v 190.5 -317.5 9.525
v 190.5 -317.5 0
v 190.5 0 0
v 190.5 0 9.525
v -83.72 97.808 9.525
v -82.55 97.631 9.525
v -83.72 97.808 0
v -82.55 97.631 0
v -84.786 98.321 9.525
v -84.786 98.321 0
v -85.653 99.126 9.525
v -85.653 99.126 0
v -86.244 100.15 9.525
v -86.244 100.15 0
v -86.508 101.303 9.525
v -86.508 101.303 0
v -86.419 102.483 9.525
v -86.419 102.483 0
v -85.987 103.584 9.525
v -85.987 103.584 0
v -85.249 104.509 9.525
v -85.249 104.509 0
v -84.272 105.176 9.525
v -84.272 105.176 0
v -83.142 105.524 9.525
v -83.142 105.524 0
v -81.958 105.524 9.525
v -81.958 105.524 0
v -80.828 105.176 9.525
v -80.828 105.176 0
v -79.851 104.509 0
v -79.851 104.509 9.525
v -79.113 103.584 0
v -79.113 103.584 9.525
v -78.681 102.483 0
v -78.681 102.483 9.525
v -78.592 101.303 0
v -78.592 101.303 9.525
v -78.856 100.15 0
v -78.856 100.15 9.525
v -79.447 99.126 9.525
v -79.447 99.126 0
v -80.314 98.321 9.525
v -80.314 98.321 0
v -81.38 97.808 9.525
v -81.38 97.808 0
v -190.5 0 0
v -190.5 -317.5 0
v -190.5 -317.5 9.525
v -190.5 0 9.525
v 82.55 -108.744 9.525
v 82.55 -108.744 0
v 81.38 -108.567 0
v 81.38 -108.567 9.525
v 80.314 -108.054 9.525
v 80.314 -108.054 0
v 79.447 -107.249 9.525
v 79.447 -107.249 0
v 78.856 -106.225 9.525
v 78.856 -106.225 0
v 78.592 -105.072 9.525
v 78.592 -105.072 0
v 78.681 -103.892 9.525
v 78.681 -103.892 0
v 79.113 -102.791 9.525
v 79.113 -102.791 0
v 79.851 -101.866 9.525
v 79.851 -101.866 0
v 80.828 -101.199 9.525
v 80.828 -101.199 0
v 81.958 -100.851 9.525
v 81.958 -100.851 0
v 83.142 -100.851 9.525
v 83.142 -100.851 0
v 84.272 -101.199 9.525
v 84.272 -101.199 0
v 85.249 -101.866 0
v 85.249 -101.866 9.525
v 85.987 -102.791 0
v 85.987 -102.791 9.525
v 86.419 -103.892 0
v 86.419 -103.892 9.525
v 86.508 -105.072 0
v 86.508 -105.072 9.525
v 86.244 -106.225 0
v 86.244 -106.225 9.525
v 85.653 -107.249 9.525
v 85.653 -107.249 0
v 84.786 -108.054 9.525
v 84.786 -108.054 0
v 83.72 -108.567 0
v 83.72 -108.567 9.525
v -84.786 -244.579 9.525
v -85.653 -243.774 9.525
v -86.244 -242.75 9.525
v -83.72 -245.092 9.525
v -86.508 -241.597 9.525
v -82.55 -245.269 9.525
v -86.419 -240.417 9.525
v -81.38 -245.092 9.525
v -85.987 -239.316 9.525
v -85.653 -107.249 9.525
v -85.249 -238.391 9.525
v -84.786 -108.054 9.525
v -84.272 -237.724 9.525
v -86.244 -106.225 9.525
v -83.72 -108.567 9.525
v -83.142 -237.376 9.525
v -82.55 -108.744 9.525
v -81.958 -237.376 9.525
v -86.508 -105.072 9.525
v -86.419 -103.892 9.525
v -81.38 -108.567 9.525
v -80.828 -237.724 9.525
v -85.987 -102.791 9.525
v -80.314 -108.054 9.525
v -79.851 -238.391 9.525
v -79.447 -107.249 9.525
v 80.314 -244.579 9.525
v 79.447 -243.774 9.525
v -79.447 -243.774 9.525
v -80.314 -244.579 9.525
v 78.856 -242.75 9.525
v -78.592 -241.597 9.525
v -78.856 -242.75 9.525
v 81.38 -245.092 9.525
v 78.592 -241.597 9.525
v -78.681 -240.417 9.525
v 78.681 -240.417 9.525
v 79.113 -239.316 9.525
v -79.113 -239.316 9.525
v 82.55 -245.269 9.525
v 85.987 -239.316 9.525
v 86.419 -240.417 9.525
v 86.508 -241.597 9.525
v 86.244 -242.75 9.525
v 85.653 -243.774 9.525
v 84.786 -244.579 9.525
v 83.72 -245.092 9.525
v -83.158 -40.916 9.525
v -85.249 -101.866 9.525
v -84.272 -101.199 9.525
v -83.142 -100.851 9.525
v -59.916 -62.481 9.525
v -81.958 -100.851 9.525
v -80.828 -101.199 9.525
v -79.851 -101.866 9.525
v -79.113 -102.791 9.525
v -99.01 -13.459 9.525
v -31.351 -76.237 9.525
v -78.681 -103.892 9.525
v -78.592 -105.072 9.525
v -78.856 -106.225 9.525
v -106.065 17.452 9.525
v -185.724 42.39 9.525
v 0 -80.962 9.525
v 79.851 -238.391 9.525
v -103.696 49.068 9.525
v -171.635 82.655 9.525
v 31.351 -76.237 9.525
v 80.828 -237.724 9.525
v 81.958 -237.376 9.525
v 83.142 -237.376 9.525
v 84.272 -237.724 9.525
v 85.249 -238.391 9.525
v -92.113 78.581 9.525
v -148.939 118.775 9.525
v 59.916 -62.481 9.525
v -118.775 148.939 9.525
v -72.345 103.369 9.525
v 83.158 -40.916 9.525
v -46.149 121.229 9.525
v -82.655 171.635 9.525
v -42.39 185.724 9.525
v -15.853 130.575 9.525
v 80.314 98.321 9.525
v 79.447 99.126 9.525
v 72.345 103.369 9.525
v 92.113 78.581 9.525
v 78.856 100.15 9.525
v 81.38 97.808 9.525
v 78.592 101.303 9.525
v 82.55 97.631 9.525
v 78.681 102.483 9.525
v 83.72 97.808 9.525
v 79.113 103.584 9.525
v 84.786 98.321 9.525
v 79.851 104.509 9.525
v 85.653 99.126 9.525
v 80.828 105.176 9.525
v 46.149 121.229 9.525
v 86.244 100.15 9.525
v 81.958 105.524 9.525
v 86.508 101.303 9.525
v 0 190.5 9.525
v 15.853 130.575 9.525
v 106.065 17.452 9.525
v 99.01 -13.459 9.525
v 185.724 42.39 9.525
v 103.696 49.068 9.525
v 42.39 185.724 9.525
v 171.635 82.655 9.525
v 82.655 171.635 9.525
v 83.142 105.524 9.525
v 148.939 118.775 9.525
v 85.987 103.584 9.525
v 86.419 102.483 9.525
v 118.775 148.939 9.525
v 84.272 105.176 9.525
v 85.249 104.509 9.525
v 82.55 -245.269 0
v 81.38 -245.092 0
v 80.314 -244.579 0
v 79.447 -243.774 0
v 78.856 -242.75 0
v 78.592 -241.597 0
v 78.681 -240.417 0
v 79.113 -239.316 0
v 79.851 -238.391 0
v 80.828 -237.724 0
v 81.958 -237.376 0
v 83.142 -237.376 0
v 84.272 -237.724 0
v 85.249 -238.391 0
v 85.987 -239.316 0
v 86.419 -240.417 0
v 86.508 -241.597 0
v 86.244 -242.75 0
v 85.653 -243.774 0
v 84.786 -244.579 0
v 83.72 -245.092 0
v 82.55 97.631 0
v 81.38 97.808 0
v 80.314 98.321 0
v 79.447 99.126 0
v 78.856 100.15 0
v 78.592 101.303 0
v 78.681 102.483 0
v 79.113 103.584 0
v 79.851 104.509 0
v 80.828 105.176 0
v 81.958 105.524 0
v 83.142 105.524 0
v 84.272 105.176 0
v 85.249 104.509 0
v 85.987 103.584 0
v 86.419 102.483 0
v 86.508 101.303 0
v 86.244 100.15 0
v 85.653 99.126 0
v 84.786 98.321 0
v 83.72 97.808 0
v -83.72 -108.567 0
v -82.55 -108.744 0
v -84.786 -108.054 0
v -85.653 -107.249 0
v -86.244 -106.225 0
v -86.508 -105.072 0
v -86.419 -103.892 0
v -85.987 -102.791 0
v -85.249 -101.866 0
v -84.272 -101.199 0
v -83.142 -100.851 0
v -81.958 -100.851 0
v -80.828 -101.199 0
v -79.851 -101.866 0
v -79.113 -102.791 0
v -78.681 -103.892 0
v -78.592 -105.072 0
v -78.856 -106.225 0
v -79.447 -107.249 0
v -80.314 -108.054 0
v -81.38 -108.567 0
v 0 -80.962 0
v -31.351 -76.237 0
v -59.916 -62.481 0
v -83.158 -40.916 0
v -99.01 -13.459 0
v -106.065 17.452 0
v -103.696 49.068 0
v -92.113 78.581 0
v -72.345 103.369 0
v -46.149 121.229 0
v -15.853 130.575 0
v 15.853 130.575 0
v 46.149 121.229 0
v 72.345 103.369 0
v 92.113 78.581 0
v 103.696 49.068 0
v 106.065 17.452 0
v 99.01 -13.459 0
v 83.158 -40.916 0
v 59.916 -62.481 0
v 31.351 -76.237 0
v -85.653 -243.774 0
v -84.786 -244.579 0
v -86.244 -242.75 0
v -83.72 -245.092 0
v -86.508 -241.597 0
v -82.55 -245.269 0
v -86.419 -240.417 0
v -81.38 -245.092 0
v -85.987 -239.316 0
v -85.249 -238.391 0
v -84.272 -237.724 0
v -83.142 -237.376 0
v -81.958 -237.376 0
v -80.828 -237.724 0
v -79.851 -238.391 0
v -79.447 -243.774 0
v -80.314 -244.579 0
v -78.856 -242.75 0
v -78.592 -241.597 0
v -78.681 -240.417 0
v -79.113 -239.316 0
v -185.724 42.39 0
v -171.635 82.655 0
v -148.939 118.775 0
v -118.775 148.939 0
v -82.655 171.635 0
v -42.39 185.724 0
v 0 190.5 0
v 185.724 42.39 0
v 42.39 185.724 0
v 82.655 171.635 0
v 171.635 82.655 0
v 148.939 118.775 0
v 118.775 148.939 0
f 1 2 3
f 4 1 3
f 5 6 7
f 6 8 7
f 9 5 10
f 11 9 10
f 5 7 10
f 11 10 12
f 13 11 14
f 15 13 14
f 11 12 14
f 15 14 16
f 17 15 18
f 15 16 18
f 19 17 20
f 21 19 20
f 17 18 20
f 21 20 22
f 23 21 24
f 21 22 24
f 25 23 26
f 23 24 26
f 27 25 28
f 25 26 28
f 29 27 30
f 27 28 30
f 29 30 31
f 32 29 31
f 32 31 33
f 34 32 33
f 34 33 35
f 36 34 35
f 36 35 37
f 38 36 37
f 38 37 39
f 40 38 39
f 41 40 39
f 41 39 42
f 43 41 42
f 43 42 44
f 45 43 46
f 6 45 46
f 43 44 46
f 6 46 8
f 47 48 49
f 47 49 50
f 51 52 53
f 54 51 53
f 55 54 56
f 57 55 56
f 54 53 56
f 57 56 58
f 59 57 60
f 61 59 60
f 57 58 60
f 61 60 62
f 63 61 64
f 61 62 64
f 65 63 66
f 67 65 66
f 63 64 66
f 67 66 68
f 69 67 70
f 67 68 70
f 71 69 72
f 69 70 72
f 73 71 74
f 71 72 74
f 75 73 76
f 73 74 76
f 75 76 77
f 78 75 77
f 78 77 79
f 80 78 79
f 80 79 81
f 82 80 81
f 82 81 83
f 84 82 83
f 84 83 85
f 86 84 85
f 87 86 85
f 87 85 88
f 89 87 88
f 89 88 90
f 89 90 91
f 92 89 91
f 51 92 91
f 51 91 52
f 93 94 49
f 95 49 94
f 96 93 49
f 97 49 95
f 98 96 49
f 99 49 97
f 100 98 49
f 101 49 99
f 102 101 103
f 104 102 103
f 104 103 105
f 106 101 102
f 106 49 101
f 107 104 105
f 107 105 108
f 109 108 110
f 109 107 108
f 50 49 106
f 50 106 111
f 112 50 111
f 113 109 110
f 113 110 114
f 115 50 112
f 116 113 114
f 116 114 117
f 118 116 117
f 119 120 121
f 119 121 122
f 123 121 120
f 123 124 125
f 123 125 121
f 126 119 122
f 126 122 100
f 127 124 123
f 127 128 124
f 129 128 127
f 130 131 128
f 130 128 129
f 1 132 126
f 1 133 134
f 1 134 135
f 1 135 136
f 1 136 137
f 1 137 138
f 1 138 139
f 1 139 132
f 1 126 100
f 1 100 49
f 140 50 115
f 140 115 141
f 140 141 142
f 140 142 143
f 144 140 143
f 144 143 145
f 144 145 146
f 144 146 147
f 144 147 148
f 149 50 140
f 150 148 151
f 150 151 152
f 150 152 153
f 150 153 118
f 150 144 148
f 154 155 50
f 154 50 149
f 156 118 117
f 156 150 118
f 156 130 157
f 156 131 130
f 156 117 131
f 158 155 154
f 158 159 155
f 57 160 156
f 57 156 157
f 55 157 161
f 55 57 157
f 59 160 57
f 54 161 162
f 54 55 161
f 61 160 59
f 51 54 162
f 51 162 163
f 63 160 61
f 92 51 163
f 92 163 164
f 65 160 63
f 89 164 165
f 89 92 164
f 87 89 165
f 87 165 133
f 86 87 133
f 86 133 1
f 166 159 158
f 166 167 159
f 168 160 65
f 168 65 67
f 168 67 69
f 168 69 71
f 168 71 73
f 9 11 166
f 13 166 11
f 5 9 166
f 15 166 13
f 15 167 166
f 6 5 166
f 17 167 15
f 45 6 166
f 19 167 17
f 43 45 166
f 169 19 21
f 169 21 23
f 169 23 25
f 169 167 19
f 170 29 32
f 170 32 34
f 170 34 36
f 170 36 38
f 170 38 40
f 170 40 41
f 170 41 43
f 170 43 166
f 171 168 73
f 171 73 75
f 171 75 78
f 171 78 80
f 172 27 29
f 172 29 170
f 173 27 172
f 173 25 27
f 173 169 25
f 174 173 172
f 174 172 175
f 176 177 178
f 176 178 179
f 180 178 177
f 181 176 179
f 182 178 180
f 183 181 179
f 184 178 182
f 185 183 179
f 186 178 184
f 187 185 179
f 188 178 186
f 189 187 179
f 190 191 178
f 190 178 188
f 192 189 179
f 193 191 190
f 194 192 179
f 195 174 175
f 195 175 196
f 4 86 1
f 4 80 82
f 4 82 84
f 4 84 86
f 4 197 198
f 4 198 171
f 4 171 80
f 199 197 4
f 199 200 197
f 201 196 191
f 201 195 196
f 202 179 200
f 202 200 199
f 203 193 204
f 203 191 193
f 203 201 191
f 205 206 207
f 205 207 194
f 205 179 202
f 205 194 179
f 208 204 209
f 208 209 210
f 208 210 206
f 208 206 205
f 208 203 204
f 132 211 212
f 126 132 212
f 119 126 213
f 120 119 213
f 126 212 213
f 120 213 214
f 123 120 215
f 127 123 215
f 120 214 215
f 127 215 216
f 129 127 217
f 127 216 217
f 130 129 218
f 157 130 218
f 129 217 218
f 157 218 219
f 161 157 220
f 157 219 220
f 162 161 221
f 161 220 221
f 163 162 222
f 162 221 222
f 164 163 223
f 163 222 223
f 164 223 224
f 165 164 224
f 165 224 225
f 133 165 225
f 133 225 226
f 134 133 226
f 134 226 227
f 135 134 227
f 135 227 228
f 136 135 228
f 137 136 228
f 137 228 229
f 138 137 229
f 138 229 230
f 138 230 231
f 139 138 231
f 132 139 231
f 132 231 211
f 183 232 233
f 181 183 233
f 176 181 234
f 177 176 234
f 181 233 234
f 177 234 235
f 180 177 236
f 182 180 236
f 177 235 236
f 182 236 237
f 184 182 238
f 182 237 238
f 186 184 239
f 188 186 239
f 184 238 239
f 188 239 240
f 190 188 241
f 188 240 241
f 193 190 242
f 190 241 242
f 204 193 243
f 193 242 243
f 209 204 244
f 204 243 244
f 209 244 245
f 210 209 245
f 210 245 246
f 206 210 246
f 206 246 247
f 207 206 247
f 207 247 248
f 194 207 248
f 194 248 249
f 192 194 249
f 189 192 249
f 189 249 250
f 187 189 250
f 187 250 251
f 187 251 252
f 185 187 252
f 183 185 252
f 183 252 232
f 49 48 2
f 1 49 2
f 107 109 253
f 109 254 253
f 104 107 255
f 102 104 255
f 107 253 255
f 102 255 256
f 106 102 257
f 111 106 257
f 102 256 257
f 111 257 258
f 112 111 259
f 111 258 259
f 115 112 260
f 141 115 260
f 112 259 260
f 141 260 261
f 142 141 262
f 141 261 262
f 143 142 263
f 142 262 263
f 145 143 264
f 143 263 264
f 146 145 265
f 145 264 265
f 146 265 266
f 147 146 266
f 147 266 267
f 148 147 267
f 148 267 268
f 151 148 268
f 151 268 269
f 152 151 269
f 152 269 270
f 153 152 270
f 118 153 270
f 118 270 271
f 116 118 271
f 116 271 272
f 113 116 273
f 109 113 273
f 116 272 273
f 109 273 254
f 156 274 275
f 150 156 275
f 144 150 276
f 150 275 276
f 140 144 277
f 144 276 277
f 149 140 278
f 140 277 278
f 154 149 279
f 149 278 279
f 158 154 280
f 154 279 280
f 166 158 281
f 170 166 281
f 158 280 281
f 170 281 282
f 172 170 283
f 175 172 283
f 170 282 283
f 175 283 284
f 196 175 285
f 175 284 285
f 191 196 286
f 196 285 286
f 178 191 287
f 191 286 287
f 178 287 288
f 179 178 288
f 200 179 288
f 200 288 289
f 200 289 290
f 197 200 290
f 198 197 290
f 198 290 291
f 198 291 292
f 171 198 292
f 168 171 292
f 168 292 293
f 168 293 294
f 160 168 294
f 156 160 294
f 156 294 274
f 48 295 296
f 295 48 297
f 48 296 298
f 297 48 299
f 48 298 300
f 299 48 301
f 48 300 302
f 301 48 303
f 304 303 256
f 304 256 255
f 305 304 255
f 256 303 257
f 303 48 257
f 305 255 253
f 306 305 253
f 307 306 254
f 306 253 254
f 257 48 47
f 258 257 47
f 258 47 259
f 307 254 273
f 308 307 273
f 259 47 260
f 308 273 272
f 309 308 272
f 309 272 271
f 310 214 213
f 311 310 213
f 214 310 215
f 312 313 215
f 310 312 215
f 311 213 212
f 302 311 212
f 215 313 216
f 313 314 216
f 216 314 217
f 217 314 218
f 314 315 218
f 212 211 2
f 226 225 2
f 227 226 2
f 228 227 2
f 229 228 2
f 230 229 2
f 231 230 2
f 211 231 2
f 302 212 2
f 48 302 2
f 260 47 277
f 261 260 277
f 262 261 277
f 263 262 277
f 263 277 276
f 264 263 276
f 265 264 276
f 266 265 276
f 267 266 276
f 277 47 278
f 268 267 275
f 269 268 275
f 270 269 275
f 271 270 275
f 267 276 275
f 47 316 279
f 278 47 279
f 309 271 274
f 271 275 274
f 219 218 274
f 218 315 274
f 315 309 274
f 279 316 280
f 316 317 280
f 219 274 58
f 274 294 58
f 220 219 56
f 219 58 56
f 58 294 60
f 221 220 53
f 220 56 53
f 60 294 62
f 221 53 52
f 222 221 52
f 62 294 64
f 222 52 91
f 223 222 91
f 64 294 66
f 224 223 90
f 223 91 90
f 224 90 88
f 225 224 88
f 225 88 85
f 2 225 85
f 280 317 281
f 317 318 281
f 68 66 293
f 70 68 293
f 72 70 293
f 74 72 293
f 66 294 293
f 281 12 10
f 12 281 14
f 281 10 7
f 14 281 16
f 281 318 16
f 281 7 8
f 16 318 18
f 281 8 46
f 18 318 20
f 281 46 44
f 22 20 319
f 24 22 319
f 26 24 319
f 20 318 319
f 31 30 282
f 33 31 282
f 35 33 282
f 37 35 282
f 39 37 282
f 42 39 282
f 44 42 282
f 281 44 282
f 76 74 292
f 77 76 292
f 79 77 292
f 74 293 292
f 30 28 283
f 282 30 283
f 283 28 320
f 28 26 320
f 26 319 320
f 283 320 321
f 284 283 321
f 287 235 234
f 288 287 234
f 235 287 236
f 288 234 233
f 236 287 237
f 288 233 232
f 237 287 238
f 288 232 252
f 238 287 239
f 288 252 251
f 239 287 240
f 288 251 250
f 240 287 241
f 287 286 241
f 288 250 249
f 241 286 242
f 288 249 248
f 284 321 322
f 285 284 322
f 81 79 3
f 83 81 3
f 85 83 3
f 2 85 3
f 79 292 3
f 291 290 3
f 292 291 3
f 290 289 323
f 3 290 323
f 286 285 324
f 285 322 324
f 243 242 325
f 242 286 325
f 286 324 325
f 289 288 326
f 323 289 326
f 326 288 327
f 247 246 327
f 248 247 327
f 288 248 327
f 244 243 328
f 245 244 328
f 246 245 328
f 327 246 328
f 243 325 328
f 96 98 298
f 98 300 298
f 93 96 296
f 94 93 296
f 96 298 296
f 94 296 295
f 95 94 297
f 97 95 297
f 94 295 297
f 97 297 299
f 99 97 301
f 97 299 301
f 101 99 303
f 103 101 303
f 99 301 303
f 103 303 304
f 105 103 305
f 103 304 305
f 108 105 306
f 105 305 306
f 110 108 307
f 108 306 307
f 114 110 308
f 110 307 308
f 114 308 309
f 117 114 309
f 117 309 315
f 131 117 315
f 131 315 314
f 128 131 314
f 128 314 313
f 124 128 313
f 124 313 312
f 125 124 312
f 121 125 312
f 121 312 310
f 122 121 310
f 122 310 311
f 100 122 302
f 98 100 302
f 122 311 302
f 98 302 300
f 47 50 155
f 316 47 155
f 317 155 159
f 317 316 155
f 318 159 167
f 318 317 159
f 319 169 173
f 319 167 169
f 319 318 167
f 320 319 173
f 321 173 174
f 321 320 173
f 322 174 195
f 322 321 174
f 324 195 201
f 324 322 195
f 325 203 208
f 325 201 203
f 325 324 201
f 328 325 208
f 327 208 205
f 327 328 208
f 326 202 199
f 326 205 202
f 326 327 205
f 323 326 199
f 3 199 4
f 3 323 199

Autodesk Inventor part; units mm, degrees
ref_plane "YZ Plane" through (0, 0, 0) normal (1, 0, 0) x (0, 1, 0)
ref_plane "XZ Plane" through (0, 0, 0) normal (0, 1, 0) x (-1, 0, 0)
ref_plane "XY Plane" through (0, 0, 0) normal (0, 0, 1) x (1, 0, 0)
sketch "Sketch1" plane through (0, 0, 0) normal (0, 0, 1) x (1, 0, 0)
  line L0 (-190.5, -317.5) -> (190.5, -317.5)
  line L1 (190.5, -317.5) -> (190.5, 0)
  line L2 (-190.5, -317.5) -> (-190.5, 0)
  arc A0 (190.5, 0) -> (-190.5, 0) centre (0, 0) ccw
  dimension "d0" = 508
  dimension "d1" = 381
extrude "Extrusion1" add sketch "Sketch1" along normal blind 9.525
hole "Hole1" at (82.55, -241.3, 9.525) direction (0, 0, -1) diameter 7.9375 depth 25.4 tip angle 118
hole "Hole2" at (-82.55, -241.3, 9.525) direction (0, 0, -1) diameter 7.9375 depth 25.4 tip angle 118
hole "Hole3" at (82.55, -104.775, 9.525) direction (0, 0, -1) diameter 7.9375 depth 25.4 tip angle 118
hole "Hole4" at (-82.55, -104.775, 9.525) direction (0, 0, -1) diameter 7.9375 depth 25.4 tip angle 118
hole "Hole5" at (-82.55, 101.6, 9.525) direction (0, 0, -1) diameter 7.9375 depth 25.4 tip angle 118
hole "Hole6" at (82.55, 101.6, 9.525) direction (0, 0, -1) diameter 7.9375 depth 25.4 tip angle 118
hole "Hole7" at (0, 25.4, 9.525) direction (0, 0, -1) diameter 212.725 depth 25.4 tip angle 118
properties part number "Top_Deck"
